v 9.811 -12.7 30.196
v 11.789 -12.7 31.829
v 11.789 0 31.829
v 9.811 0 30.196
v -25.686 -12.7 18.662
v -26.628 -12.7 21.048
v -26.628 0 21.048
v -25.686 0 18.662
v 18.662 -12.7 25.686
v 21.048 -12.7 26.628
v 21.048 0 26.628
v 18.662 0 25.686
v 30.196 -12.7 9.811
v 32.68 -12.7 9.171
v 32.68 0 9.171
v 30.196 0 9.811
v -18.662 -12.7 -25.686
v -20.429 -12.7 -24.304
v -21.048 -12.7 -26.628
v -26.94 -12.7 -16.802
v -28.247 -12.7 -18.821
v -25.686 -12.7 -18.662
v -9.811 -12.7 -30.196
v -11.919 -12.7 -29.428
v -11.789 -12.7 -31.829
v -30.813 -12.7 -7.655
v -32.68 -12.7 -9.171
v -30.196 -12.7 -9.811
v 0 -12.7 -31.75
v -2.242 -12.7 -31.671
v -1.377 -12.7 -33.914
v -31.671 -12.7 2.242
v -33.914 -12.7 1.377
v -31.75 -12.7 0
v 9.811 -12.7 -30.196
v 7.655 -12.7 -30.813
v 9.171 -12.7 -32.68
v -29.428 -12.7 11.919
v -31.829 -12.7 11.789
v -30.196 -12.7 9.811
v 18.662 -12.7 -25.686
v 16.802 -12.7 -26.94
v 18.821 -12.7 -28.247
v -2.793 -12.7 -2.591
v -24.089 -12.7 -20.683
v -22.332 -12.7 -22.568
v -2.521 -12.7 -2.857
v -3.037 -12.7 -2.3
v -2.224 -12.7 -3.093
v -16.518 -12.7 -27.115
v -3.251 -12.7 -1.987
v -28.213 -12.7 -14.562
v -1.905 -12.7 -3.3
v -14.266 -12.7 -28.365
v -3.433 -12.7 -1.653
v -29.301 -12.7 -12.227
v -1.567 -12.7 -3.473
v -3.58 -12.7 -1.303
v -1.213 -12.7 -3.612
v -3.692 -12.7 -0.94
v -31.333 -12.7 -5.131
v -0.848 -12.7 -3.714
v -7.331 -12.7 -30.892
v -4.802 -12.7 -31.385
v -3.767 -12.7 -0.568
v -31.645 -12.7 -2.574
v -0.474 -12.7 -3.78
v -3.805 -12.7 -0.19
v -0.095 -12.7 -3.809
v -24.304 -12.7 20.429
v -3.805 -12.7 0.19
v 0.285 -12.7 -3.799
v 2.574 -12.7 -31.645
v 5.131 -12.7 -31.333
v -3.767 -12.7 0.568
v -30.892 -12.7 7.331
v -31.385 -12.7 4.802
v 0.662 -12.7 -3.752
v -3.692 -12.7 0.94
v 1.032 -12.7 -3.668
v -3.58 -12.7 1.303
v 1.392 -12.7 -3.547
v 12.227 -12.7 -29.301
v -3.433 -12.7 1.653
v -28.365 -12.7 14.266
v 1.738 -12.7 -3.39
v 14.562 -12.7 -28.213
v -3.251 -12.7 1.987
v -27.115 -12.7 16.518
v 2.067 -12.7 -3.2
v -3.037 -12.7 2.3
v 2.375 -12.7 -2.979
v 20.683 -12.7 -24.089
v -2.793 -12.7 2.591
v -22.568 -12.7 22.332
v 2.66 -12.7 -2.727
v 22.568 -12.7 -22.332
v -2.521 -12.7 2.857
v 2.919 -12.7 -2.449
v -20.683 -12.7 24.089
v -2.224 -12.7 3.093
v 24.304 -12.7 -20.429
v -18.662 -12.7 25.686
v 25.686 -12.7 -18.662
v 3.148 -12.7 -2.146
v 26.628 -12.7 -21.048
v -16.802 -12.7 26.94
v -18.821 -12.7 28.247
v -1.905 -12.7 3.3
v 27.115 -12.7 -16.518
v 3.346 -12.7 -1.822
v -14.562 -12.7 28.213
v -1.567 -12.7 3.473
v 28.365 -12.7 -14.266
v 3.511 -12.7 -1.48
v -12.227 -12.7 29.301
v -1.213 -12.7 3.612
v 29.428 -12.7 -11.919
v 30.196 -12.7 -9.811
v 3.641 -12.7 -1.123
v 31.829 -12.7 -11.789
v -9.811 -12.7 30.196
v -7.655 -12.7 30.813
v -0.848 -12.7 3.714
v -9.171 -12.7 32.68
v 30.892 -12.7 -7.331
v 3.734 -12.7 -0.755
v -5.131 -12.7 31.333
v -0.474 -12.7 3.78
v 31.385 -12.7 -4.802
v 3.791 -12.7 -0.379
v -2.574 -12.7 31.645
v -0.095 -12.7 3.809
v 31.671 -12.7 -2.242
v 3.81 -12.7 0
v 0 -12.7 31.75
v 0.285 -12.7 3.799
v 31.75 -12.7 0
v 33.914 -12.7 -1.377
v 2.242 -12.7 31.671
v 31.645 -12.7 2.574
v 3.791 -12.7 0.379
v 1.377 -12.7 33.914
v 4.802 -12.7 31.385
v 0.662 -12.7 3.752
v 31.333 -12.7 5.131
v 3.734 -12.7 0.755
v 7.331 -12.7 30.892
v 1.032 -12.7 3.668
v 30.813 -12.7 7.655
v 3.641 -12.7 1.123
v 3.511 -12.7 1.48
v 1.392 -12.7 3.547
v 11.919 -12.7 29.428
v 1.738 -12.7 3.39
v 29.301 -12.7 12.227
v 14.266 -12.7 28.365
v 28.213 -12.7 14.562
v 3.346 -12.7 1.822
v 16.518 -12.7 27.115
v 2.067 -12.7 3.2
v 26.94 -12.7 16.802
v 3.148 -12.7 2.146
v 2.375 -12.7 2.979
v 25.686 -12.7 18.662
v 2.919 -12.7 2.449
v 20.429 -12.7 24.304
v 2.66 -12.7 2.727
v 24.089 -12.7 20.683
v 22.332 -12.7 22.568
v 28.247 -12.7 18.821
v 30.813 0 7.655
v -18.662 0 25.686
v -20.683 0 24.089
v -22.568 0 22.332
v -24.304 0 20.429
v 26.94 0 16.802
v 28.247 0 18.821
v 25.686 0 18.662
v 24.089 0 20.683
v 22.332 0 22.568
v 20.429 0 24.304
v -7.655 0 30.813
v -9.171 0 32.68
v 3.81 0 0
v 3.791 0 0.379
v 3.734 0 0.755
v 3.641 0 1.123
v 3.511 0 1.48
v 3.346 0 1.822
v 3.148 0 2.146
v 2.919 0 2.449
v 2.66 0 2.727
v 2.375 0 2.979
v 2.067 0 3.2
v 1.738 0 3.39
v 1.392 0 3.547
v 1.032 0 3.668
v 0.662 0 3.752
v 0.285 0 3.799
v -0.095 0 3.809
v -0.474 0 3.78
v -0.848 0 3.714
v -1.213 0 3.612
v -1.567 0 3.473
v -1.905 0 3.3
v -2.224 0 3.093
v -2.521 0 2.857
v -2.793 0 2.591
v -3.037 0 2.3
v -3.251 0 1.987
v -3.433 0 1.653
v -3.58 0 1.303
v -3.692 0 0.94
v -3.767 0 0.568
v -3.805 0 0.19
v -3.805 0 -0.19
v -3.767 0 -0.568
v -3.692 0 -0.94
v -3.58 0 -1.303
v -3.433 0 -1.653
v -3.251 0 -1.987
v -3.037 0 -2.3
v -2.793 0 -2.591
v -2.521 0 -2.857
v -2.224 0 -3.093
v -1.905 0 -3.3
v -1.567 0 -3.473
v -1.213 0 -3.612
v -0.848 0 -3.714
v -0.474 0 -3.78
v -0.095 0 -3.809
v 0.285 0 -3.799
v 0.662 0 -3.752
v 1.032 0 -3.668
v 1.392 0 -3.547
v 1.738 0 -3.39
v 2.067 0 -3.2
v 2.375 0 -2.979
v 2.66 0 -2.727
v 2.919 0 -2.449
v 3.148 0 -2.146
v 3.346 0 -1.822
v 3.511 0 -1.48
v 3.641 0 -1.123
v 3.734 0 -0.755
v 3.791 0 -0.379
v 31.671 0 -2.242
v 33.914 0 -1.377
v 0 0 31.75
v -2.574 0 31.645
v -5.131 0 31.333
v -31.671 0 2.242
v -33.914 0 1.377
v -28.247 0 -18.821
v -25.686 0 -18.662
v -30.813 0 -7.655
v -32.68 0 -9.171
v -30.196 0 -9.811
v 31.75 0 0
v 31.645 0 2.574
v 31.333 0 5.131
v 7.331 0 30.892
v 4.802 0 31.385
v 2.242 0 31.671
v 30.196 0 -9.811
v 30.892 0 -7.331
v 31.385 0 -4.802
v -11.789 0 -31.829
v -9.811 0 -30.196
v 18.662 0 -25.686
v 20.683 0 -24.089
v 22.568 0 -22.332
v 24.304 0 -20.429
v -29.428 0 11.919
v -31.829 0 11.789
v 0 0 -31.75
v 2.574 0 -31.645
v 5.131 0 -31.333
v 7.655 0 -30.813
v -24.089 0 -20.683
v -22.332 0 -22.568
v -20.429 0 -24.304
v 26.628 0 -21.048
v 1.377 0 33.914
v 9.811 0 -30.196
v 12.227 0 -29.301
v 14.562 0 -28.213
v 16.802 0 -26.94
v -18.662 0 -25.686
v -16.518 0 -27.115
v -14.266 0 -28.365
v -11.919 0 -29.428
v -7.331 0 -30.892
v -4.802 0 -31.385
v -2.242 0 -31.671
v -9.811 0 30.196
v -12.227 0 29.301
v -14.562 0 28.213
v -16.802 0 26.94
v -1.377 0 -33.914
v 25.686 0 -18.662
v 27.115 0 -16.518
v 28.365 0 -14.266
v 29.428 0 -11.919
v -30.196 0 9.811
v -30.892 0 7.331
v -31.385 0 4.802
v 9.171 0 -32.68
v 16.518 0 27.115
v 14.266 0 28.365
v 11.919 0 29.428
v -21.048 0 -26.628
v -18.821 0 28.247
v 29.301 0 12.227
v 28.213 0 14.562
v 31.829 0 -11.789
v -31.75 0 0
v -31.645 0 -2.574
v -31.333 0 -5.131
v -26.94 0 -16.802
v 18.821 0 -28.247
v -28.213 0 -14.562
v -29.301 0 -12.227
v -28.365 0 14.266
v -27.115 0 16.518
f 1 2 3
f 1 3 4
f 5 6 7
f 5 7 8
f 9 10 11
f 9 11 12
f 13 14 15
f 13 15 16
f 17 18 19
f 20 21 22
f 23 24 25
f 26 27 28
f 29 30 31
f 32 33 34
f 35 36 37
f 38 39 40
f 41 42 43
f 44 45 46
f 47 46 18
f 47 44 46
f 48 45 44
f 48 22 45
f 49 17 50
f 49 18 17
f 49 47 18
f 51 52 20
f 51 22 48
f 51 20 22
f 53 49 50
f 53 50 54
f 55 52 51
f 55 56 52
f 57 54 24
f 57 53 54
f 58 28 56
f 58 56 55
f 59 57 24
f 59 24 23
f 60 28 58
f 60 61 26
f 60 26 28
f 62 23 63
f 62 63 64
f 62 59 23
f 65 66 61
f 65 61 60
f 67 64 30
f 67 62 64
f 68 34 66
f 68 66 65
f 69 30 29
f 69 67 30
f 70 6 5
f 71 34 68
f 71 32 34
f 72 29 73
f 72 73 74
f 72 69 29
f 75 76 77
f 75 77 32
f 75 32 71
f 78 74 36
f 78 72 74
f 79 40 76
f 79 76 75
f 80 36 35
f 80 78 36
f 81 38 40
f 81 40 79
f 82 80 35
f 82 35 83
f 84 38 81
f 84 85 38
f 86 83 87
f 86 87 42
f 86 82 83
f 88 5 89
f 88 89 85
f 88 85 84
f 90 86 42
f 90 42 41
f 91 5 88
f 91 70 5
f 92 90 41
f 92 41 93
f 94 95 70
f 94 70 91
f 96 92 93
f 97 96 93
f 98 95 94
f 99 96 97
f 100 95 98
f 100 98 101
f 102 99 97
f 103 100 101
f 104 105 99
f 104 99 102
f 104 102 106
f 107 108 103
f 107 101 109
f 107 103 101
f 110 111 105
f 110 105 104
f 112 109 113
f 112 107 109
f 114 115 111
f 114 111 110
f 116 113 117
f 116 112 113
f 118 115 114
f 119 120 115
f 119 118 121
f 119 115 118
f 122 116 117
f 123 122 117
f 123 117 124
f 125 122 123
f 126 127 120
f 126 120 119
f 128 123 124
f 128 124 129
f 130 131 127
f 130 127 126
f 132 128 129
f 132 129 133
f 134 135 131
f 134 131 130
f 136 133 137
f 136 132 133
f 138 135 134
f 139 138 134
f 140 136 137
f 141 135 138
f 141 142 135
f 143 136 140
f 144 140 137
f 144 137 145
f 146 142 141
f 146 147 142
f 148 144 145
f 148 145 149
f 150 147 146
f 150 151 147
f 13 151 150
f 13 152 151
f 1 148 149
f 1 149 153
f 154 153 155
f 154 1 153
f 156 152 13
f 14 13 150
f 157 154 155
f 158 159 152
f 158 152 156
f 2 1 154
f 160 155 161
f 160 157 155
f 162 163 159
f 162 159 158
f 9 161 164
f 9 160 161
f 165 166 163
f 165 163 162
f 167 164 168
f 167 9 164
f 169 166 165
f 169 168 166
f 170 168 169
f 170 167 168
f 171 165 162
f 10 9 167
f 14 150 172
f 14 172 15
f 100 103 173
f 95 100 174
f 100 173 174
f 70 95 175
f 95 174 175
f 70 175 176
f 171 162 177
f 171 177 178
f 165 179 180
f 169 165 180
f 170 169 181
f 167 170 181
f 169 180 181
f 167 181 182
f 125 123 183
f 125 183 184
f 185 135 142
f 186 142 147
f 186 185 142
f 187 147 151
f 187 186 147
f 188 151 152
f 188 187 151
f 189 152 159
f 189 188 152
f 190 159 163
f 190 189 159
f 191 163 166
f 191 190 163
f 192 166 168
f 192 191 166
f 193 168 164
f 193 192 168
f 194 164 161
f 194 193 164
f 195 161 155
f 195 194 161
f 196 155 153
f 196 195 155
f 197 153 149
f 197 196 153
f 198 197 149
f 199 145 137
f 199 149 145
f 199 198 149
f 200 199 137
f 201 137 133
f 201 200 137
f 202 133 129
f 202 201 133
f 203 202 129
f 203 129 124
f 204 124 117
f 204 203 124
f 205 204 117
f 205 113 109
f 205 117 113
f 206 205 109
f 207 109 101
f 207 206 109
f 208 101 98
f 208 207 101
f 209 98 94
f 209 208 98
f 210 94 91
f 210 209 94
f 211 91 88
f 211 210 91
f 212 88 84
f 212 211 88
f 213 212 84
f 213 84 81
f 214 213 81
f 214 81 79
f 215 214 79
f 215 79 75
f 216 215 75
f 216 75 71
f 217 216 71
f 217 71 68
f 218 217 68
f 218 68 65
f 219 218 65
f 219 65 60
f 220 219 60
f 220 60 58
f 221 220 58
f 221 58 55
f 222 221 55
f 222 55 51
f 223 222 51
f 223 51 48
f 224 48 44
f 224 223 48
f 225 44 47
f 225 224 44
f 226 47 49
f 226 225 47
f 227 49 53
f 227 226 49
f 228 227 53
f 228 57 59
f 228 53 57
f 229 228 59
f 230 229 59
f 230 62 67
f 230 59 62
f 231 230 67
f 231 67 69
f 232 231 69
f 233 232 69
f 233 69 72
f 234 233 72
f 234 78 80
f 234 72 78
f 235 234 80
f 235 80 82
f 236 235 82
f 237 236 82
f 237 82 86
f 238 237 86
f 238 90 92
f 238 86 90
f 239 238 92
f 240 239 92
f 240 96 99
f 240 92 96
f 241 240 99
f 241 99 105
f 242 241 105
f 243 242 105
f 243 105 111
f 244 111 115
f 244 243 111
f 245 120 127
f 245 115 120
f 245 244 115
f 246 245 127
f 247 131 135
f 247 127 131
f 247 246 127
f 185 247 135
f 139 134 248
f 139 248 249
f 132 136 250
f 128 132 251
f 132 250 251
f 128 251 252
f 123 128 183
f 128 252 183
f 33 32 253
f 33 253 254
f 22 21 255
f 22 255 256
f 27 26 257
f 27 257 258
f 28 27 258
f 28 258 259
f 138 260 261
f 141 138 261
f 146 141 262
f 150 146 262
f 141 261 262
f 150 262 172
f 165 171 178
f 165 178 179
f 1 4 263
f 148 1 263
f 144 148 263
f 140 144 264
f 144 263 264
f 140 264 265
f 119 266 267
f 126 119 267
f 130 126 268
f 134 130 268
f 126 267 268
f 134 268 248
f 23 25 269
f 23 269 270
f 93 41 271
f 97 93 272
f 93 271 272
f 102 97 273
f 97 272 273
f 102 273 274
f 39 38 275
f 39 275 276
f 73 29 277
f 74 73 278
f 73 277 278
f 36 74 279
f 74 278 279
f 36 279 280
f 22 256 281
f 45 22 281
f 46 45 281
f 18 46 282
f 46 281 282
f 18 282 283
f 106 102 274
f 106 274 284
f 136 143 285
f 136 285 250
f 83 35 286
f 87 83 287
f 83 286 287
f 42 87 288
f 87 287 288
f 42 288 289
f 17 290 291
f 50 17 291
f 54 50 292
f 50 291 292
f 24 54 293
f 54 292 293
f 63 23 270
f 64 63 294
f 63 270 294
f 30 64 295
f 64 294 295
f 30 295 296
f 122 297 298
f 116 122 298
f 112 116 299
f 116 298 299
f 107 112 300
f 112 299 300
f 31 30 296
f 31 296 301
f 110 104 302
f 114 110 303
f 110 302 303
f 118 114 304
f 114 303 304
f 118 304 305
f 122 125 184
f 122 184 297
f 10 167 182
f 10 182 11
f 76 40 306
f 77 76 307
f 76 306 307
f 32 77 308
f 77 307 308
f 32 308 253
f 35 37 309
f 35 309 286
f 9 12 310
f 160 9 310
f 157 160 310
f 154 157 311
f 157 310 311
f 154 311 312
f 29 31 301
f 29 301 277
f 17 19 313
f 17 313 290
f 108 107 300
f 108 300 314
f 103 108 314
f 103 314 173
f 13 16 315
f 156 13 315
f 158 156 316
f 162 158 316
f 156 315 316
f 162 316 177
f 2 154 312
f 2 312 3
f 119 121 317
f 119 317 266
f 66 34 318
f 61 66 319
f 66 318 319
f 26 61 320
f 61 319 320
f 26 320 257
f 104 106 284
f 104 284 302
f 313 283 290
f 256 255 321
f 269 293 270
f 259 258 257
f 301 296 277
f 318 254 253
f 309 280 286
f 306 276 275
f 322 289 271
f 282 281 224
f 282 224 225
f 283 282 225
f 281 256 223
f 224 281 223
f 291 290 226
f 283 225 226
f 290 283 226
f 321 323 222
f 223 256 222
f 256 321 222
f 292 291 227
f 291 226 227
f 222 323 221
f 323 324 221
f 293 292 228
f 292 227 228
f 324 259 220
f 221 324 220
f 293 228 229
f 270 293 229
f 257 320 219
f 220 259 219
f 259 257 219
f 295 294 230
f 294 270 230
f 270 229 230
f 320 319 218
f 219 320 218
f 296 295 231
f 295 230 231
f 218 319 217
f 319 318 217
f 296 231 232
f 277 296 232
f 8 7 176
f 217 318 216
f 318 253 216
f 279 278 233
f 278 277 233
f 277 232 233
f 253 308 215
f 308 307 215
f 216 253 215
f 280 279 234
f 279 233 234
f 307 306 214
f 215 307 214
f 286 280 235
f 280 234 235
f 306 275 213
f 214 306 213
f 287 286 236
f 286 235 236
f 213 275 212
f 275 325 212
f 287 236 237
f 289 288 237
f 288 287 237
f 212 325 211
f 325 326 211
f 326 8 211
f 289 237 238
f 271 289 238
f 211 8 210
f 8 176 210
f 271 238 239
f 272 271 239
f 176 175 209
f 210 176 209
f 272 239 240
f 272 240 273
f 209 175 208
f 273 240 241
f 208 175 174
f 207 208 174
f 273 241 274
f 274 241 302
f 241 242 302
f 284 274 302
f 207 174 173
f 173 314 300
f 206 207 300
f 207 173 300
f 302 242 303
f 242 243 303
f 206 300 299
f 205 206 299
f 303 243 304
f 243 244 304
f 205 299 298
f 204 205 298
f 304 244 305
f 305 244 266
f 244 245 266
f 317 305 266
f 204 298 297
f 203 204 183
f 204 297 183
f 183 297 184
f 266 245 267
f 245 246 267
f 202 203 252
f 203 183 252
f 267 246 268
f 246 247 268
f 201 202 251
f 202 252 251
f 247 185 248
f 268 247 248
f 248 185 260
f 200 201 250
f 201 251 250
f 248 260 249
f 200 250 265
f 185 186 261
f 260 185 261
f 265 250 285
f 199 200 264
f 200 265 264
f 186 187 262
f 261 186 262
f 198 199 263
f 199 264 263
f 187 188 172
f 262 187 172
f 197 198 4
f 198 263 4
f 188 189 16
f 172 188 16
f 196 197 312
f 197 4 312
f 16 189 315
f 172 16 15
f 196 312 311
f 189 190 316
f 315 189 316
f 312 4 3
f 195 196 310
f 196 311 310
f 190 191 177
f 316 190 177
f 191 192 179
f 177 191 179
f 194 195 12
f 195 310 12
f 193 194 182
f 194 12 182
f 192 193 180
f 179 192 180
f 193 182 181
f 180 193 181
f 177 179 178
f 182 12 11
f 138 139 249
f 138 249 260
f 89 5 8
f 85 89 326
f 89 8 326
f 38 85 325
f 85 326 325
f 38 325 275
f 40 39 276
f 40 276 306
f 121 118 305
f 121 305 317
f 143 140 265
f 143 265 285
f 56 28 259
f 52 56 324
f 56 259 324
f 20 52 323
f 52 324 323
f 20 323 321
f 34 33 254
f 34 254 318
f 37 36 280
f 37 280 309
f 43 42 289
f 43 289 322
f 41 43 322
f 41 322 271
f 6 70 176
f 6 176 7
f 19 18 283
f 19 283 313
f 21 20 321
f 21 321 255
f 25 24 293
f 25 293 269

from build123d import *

# Parameters (mm, degrees)
F0_R     = 31.75
F0_R_2   = 3.81
F1_DEPTH = 12.7
F4_DEPTH = 12.7
F5_COUNT = 20


with BuildPart() as f1:
    # F0 (on Front) → F1 (new body)
    with BuildSketch(Plane.XZ):
        Circle(F0_R)
        Circle(F0_R_2, mode=Mode.SUBTRACT)
    extrude(amount=F1_DEPTH)

    # F2 (on face) → F4 (join, through all)
    with BuildSketch(Plane.XZ.offset(12.7)):
        with BuildLine():
            Line((1.376606524, 33.9144617319), (0, 31.75))
            ThreePointArc((0, 31.75), (1.1215923583, 31.7301832737), (2.2417846354, 31.6707578319))
            Line((2.2417846354, 31.6707578319), (1.376606524, 33.9144617319))
        make_face()
    extrude(amount=-F4_DEPTH)

    # F5: F1 ×20 about axis
    f5_axis = Axis((0, -7.9411361367, 0), (0, -1, 0))


with BuildPart() as f1_1:
    add(f1.part)
    for i in range(1, F5_COUNT):
        add(f1.part.rotate(f5_axis, i * 360 / F5_COUNT))


solid = f1_1.part
